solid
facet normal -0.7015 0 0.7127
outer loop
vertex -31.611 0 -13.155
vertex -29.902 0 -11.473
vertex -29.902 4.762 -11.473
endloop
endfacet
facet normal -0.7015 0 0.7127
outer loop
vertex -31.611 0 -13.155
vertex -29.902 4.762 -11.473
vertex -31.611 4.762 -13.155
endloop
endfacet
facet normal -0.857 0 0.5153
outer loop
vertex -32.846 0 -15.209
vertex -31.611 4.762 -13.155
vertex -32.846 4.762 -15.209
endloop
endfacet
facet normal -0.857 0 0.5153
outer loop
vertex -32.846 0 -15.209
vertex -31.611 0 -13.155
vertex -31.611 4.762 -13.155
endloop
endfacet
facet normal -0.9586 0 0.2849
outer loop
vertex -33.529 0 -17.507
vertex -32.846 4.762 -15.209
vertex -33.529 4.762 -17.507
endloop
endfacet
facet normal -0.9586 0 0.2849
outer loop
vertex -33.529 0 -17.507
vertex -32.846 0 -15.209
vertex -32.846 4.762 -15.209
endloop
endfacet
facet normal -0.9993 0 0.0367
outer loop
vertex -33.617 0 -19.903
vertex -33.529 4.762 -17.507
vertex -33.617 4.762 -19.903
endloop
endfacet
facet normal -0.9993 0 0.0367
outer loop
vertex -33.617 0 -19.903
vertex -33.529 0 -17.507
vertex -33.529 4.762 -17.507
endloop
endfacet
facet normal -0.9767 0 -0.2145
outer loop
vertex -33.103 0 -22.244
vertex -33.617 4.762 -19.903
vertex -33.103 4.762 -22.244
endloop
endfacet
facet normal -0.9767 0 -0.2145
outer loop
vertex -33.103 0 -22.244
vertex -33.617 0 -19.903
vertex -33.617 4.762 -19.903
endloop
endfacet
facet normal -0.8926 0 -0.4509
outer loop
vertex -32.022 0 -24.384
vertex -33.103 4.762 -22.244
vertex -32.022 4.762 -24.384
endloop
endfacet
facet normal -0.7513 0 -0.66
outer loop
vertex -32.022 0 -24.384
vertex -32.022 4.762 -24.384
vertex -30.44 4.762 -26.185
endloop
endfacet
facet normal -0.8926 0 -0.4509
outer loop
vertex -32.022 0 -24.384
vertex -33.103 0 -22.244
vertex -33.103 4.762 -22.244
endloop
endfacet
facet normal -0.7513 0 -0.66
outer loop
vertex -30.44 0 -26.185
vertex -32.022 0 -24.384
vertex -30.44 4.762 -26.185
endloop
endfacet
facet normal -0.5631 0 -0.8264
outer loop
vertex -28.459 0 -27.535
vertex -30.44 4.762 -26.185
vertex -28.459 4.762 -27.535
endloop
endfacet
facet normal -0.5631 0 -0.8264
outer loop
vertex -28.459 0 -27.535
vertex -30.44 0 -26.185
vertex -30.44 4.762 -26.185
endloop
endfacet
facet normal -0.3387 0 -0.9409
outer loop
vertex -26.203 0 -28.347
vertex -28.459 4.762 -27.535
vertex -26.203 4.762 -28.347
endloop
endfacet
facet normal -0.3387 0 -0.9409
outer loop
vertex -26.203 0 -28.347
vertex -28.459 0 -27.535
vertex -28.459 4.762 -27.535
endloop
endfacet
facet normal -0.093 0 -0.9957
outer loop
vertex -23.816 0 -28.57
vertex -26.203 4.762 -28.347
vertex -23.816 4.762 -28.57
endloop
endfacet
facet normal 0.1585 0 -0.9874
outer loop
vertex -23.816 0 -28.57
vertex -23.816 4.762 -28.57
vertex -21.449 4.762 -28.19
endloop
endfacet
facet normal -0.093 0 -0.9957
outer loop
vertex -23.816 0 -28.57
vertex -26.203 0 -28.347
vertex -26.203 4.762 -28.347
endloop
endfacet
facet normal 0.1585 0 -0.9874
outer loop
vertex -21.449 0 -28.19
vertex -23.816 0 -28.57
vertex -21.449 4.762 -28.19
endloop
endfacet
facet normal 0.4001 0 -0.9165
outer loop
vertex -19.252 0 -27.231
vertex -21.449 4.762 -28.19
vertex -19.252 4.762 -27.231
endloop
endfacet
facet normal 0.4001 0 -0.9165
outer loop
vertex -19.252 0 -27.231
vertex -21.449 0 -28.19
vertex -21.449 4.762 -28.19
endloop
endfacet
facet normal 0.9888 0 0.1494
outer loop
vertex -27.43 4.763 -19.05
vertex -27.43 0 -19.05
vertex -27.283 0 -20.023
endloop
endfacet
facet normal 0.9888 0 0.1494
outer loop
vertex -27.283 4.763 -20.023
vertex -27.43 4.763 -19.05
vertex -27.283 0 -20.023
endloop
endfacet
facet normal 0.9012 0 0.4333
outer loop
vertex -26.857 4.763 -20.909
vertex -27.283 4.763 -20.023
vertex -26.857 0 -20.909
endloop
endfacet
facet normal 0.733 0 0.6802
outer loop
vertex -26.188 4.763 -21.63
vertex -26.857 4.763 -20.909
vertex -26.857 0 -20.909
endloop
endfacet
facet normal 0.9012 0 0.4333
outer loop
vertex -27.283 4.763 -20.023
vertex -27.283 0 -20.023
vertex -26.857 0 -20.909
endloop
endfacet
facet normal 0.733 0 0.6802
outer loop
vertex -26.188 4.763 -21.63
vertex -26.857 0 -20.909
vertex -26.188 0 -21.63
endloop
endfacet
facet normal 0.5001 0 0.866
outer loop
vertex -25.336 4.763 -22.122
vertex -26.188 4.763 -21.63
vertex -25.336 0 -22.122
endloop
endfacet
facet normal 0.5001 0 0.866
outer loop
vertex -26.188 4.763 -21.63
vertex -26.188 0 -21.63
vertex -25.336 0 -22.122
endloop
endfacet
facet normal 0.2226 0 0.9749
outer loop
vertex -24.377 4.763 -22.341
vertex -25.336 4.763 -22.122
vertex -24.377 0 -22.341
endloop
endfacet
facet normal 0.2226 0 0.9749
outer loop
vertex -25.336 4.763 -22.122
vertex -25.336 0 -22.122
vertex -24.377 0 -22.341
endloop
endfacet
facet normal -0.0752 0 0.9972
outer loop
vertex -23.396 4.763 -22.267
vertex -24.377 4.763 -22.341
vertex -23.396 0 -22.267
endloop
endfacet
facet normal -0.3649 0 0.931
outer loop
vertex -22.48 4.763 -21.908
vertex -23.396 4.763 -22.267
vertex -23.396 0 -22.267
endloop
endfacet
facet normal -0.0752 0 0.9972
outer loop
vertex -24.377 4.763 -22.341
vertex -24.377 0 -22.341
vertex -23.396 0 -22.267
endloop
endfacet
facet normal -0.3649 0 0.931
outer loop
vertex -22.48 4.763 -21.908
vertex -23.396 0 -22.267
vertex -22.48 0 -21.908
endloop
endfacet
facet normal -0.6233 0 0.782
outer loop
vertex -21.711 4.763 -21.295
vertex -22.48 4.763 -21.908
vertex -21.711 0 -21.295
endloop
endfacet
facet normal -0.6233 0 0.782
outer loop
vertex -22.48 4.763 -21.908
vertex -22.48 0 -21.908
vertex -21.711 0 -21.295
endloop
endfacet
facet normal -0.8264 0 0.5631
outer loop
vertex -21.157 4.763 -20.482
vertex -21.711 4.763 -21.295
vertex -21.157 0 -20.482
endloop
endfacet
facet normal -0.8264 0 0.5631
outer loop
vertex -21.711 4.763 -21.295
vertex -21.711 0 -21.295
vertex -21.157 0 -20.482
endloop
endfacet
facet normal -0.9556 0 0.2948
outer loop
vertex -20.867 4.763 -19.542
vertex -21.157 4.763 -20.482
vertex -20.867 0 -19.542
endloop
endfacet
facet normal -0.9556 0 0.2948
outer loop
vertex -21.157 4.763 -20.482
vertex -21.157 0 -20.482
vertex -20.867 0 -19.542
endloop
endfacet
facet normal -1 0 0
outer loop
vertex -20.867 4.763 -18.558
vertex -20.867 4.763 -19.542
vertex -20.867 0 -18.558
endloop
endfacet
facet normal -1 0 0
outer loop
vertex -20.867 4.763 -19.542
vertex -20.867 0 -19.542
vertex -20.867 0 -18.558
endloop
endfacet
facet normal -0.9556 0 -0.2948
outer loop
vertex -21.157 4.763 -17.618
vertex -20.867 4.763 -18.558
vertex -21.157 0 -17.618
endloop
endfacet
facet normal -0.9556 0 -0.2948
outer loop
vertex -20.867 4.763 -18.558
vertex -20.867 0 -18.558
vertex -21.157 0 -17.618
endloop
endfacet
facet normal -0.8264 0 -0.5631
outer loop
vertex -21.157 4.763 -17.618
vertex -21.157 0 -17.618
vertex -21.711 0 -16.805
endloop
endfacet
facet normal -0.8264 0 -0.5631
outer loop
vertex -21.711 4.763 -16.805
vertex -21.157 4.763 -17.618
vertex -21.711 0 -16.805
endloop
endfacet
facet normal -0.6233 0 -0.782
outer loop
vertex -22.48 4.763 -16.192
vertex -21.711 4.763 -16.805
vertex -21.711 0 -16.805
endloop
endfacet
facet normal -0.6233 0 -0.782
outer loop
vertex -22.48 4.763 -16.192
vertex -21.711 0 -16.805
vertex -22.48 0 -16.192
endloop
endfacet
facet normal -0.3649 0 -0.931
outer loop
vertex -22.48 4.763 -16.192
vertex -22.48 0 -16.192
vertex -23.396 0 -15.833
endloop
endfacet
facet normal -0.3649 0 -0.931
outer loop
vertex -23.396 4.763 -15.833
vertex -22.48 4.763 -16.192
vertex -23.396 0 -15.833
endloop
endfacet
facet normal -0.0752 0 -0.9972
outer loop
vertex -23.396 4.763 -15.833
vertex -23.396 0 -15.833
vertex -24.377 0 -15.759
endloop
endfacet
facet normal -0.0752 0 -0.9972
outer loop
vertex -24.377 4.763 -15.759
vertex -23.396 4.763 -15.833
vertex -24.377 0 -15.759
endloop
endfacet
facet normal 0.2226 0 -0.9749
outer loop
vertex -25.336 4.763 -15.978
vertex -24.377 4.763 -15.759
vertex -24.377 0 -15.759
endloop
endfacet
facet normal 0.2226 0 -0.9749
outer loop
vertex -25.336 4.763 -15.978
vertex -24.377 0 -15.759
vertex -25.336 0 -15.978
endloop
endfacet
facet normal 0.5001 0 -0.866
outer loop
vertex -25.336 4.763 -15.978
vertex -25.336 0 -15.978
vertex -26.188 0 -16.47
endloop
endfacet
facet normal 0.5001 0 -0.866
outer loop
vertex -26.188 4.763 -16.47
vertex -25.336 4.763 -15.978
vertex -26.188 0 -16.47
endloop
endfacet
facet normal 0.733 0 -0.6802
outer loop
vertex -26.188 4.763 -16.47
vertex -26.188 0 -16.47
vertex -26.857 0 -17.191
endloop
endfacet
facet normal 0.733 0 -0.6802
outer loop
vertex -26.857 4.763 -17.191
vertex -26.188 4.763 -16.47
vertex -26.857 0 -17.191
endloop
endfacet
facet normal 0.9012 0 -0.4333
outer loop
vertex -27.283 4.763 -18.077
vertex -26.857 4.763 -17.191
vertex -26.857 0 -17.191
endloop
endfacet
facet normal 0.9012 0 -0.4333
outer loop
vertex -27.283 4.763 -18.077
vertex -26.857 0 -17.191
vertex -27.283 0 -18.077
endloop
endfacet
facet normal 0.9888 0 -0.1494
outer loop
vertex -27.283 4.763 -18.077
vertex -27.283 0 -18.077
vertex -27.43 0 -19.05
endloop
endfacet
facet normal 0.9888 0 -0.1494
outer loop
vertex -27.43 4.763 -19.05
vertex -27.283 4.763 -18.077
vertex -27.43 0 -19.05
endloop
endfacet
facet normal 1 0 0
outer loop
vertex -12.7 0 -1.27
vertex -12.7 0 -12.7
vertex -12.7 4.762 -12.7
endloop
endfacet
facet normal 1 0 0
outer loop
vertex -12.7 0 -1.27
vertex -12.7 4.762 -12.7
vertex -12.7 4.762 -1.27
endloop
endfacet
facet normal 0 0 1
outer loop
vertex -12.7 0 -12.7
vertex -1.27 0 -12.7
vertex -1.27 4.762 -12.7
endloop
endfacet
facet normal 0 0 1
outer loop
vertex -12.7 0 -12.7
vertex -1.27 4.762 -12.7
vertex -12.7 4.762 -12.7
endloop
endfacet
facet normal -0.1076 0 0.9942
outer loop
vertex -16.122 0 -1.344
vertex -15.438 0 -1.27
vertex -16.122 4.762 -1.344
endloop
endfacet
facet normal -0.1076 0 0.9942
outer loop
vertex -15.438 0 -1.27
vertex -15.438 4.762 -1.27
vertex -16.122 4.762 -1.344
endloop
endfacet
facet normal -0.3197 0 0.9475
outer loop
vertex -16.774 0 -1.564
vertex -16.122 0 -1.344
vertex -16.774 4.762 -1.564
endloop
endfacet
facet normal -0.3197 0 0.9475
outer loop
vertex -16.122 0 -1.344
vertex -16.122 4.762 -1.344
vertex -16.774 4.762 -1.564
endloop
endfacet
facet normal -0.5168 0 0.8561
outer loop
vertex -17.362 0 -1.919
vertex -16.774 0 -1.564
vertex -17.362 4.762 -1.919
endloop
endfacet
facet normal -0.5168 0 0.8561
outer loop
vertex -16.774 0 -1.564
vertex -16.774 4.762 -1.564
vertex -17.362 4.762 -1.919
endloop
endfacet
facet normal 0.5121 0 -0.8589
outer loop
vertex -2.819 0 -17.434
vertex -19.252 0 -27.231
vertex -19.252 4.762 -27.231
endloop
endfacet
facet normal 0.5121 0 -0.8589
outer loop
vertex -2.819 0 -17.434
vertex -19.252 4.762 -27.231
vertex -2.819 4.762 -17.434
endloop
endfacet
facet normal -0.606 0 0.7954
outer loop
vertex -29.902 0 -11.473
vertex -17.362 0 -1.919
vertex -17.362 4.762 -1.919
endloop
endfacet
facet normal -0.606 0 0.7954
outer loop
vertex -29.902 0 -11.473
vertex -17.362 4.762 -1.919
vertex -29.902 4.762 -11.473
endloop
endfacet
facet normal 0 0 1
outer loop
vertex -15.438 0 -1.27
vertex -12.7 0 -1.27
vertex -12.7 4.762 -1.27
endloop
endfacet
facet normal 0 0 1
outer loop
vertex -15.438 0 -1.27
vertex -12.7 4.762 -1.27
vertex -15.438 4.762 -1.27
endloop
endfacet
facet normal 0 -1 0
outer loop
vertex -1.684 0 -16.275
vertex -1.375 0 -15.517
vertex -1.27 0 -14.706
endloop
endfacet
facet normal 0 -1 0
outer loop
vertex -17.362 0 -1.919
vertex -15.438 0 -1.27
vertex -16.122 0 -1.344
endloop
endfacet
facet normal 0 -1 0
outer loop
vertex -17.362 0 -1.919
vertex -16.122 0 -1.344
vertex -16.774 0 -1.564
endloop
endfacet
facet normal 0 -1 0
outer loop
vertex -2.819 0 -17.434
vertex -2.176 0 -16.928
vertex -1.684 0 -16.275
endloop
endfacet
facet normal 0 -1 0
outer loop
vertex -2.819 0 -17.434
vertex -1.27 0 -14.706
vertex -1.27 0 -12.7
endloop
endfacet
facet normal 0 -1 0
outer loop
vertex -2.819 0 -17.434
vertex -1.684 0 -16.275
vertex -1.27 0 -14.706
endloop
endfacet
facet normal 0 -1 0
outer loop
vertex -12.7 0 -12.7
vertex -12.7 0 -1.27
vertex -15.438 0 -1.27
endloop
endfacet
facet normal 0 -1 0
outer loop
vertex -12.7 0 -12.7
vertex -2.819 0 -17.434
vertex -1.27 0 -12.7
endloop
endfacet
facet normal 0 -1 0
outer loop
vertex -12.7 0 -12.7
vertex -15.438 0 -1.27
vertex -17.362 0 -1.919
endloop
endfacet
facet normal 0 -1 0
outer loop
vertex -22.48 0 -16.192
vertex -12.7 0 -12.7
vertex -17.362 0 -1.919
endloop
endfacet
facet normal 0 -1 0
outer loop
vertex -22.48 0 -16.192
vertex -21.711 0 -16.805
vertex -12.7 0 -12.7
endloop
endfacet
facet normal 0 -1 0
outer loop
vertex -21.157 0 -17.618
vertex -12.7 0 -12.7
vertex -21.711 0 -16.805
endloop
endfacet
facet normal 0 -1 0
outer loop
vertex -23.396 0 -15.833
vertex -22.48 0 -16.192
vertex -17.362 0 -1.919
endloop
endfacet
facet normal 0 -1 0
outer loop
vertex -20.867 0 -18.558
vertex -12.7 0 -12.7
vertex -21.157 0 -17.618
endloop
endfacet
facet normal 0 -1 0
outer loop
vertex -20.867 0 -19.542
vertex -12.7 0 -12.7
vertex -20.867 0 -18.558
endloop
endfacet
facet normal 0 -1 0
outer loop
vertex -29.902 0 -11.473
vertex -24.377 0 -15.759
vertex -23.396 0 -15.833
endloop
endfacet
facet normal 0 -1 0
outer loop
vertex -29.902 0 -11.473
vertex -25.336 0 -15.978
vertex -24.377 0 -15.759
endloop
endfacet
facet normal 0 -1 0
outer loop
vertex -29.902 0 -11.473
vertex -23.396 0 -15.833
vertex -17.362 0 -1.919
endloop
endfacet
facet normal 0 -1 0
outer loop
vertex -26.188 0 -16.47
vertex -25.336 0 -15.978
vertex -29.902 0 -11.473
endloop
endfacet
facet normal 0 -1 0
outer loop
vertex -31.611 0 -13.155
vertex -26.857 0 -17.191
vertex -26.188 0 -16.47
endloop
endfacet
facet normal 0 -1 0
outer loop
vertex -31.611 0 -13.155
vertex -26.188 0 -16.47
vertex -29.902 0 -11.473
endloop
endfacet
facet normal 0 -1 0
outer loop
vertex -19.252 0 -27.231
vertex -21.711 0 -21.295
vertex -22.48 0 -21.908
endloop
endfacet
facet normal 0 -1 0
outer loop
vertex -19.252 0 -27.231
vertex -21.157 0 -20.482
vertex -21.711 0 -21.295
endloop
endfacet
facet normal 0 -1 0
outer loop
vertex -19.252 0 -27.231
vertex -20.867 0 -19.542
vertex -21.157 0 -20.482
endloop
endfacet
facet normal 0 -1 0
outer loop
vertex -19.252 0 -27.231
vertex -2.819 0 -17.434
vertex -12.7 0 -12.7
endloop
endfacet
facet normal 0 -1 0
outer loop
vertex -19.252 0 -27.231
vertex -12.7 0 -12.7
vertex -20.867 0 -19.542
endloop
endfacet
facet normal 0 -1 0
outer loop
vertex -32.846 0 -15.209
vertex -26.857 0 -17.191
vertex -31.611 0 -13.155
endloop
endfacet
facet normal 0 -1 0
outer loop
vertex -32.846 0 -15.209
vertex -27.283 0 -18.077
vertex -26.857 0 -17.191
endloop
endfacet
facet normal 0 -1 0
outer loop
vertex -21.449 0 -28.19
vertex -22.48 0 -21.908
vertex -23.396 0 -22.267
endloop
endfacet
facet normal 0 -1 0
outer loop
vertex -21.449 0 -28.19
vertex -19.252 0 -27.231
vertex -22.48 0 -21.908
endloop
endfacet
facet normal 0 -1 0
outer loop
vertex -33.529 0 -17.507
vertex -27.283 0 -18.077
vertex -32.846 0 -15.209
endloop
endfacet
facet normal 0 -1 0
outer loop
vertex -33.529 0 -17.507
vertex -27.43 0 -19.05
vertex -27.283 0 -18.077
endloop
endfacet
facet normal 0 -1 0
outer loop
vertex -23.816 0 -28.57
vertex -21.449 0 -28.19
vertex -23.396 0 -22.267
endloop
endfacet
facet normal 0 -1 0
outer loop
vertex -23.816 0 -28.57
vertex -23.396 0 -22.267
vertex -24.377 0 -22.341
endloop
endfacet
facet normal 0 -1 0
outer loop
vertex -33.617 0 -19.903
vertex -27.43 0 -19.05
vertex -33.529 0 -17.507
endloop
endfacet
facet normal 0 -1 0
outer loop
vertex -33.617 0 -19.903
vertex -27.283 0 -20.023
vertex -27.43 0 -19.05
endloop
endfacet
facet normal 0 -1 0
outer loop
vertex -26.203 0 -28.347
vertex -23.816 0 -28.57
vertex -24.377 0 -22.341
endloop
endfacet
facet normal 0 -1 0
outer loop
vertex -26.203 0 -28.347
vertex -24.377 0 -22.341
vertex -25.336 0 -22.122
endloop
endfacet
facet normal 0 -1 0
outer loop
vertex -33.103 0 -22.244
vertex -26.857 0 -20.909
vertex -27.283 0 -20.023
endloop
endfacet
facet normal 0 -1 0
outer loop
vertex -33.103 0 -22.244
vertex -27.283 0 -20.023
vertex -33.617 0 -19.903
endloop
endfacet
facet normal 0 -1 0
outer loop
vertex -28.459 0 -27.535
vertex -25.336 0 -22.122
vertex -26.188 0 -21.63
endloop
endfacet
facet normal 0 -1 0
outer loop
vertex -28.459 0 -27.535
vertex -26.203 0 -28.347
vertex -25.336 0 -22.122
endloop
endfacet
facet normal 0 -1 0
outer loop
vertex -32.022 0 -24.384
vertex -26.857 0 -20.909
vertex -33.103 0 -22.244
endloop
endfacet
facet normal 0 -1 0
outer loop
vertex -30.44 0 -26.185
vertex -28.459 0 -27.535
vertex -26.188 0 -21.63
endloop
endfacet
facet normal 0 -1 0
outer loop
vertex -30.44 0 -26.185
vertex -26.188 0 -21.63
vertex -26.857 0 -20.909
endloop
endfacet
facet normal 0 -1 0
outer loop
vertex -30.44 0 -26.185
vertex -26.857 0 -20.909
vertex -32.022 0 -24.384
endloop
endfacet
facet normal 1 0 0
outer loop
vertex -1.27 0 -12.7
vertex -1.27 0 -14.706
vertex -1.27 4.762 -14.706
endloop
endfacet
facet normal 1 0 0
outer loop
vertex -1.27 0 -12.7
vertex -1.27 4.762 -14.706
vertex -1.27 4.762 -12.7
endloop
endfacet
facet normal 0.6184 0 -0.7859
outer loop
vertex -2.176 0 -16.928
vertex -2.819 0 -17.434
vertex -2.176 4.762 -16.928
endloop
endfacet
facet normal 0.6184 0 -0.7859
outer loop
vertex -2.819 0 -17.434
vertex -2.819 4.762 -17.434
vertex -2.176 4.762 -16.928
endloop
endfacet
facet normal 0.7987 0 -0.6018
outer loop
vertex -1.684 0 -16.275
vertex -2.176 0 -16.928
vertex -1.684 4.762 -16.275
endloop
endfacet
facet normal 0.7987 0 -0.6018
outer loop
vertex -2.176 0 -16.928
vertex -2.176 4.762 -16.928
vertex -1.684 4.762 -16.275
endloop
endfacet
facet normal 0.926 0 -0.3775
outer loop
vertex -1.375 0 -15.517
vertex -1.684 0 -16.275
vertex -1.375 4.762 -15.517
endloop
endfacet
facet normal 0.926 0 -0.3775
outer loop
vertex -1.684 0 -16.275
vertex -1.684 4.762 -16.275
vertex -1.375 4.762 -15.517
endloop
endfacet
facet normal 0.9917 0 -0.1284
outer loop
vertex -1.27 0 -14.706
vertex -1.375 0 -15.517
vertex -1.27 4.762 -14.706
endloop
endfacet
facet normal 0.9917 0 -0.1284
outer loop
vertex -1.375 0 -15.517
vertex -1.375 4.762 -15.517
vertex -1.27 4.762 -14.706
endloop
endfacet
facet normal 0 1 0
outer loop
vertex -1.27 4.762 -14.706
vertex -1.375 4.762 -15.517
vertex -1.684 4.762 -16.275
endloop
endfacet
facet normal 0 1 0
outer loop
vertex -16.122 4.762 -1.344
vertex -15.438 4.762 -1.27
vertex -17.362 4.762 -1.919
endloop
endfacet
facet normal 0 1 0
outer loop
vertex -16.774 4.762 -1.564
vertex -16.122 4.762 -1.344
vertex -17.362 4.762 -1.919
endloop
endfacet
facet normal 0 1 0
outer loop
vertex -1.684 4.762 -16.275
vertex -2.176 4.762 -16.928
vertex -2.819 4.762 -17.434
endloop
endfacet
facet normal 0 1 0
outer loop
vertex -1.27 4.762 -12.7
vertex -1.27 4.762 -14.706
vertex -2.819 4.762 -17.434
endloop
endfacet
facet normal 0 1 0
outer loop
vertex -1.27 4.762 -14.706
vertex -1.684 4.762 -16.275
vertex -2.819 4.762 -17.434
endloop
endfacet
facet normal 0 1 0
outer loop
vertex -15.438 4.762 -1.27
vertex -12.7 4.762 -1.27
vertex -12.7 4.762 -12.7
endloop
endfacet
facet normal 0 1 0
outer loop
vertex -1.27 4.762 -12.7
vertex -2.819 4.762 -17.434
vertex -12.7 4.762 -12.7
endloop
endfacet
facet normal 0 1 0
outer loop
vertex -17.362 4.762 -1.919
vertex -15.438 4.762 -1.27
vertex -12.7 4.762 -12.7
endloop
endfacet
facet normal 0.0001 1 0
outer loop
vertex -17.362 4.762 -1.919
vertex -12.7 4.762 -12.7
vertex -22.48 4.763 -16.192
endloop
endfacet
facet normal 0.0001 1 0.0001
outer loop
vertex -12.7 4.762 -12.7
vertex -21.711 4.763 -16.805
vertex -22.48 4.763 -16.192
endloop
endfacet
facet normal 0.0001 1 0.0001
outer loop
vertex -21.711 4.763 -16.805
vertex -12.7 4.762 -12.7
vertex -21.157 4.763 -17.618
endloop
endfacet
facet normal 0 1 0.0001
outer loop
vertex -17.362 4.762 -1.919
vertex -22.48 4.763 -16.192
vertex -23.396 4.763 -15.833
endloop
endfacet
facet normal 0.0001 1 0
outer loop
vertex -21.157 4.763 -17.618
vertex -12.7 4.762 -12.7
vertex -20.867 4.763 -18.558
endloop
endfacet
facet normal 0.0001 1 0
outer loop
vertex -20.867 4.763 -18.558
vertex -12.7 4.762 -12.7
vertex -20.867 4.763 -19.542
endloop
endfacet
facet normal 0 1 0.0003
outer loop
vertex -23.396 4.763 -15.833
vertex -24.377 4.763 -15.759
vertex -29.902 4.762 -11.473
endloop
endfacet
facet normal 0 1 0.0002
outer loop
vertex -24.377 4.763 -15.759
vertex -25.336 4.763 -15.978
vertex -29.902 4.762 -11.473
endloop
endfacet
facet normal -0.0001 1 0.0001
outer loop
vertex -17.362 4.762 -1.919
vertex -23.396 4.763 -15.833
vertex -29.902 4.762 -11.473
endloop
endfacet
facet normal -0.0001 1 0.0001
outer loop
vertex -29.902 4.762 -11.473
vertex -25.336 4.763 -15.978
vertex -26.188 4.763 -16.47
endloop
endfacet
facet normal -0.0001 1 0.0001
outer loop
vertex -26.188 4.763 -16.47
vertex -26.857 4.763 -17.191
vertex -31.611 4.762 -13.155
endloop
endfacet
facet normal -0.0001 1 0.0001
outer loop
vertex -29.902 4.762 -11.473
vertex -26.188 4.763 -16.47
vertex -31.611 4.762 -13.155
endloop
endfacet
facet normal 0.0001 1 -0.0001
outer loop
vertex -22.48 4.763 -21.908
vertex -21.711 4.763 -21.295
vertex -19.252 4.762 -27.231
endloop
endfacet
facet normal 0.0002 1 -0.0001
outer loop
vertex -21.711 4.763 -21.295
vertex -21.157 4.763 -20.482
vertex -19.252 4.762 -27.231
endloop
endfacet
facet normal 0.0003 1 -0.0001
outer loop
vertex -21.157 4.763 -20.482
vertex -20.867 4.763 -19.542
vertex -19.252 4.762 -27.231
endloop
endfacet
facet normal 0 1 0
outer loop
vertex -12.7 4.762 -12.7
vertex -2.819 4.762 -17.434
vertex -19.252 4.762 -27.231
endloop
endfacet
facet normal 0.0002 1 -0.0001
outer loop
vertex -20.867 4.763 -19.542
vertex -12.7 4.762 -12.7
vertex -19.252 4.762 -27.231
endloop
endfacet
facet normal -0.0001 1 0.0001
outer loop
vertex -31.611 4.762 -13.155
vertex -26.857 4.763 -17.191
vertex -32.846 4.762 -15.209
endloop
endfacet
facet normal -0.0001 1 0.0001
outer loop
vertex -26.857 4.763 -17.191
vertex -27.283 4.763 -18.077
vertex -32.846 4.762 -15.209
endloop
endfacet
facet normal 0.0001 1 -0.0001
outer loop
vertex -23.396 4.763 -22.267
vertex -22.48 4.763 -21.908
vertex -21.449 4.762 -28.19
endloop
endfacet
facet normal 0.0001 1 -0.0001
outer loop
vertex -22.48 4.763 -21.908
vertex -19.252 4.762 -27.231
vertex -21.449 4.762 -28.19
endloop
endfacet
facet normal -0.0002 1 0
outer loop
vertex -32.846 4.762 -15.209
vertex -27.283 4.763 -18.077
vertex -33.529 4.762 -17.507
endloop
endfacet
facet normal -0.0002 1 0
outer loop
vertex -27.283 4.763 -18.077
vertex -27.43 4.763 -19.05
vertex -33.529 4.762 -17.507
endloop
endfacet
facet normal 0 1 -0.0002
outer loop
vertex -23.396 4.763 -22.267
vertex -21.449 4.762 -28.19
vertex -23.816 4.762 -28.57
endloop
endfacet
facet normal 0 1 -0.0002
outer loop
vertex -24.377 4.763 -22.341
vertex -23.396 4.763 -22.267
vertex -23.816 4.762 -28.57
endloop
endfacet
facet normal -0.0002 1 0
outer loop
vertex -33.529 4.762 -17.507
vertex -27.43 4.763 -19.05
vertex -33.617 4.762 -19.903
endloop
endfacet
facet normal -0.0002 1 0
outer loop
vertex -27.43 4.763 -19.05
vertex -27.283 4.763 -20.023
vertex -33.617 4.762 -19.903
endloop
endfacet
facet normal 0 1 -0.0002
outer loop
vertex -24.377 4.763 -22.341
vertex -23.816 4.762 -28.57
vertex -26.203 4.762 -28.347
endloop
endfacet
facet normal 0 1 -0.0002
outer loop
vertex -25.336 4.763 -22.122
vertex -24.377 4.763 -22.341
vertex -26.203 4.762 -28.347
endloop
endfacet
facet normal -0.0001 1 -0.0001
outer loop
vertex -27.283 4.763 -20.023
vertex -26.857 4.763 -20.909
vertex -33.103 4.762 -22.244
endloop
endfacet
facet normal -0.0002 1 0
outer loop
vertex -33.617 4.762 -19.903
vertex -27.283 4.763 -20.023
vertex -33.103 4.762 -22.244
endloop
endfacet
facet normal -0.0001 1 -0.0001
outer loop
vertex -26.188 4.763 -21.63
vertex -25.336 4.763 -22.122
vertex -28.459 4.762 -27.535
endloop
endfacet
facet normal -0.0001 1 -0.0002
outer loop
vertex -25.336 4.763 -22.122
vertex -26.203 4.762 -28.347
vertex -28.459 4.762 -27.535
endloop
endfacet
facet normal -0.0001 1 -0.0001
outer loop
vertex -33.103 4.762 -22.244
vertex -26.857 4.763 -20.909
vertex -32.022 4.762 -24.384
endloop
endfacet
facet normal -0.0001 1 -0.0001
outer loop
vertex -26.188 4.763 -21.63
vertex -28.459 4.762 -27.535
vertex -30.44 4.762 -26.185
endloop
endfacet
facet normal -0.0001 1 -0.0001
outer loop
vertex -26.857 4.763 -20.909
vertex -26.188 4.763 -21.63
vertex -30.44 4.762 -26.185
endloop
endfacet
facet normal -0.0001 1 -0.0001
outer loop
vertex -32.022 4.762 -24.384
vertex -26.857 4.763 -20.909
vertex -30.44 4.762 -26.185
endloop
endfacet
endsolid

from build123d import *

# Parameters (mm, degrees)
BOSS_EXTRUDE1_DEPTH  = 4.7625
FILLET1_R            = 3.175
M6_CLEARANCE_HOLE1_D = 6.6


with BuildPart() as part:
    # Sketch1 → Boss-Extrude1 (new body)
    with BuildSketch(Plane(origin=(0, 0, 0), x_dir=(1, 0, 0), z_dir=(0, 1, 0))):
        with BuildLine():
            Line((-19.252221857, 27.231253289), (-1.27, 16.51))
            Line((-1.27, 16.51), (-1.27, 12.7))
            Line((-1.27, 12.7), (-12.7, 12.7))
            Line((-12.7, 12.7), (-12.7, 1.27))
            Line((-12.7, 1.27), (-16.51, 1.27))
            Line((-16.51, 1.27), (-29.902438631, 11.473419158))
            ThreePointArc((-29.902438631, 11.473419158), (-32.02160557, 24.383684142), (-19.252221857, 27.231253289))
        make_face()
    extrude(amount=BOSS_EXTRUDE1_DEPTH)

    # Fillet1
    fillet1_edges = [part.edges().sort_by_distance(p)[0] for p in [
        (-16.51, 2.38125, -1.27),
        (-1.27, 2.38125, -16.51),
    ]]
    fillet(fillet1_edges, radius=FILLET1_R)

    # M6 Clearance Hole1 (through all)
    with Locations(Plane(origin=(0, 4.7625, 0), x_dir=(1, 0, 0), z_dir=(0, 1, 0))):
        with Locations((-24.13, 19.05)):
            Hole(M6_CLEARANCE_HOLE1_D / 2)


solid = part.part
